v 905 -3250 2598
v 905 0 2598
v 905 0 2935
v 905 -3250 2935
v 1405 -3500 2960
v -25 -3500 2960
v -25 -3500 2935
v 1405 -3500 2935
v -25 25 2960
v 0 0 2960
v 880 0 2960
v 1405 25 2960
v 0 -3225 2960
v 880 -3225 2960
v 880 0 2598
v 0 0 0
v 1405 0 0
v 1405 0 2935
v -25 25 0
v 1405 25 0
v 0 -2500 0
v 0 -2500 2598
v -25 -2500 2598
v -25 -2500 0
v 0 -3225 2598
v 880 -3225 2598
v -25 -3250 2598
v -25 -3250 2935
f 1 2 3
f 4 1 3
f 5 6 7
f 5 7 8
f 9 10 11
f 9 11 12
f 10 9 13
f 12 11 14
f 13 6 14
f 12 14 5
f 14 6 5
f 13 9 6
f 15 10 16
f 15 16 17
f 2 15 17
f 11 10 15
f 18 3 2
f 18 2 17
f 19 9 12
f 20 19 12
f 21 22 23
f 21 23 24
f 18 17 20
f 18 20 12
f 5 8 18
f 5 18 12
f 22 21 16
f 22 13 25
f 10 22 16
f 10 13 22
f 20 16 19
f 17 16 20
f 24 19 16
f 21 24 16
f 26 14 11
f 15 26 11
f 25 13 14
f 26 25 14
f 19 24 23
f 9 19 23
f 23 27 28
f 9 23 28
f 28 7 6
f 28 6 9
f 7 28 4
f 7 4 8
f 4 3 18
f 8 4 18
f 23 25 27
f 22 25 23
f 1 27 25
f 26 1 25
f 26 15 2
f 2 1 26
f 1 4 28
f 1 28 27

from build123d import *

# Parameters (mm, degrees)
F3_W      = 3225
F3_H      = 362
F4_DEPTH  = 25
F5_W      = 905
F5_H      = 362
F6_DEPTH  = 25
F8_DEPTH  = 25
F9_W      = 1430
F9_H      = 2960
F10_DEPTH = 25
F11_W     = 500
F11_H     = 25
F12_DEPTH = 25


with BuildPart() as f4:
    # F3 (on offset) → F4 (new body)
    with BuildSketch(Plane.YZ.offset(880)):
        with Locations((-1612.5, 2779)):
            Rectangle(F3_W, F3_H)
    extrude(amount=F4_DEPTH)

    # F5 (on offset) → F6 (join)
    with BuildSketch(Plane.XZ.offset(3225)):
        with Locations((452.5, 2779)):
            Rectangle(F5_W, F5_H)
    extrude(amount=F6_DEPTH)

    # F7 (on Right) → F8 (join)
    with BuildSketch(Plane.YZ):
        Polygon((-2500, 0), (0, 0), (0, 2960), (-3250, 2960), (-3250, 2598), (-2500, 2598), align=None)
    extrude(amount=-F8_DEPTH)

    # F9 (on Front) → F10 (join)
    with BuildSketch(Plane.XZ):
        with Locations((690, 1480)):
            Rectangle(F9_W, F9_H)
    extrude(amount=-F10_DEPTH)

    # F11 (on face) → F12 (join)
    with BuildSketch(Plane.XY.offset(2960)):
        with Locations((1155, 12.5)):
            Rectangle(F11_W, F11_H)
        Polygon((1405, 0), (905, 0), (905, -3250), (-25, -3250), (-25, -3500), (1405, -3500), align=None)
    extrude(amount=-F12_DEPTH)


solid = f4.part
